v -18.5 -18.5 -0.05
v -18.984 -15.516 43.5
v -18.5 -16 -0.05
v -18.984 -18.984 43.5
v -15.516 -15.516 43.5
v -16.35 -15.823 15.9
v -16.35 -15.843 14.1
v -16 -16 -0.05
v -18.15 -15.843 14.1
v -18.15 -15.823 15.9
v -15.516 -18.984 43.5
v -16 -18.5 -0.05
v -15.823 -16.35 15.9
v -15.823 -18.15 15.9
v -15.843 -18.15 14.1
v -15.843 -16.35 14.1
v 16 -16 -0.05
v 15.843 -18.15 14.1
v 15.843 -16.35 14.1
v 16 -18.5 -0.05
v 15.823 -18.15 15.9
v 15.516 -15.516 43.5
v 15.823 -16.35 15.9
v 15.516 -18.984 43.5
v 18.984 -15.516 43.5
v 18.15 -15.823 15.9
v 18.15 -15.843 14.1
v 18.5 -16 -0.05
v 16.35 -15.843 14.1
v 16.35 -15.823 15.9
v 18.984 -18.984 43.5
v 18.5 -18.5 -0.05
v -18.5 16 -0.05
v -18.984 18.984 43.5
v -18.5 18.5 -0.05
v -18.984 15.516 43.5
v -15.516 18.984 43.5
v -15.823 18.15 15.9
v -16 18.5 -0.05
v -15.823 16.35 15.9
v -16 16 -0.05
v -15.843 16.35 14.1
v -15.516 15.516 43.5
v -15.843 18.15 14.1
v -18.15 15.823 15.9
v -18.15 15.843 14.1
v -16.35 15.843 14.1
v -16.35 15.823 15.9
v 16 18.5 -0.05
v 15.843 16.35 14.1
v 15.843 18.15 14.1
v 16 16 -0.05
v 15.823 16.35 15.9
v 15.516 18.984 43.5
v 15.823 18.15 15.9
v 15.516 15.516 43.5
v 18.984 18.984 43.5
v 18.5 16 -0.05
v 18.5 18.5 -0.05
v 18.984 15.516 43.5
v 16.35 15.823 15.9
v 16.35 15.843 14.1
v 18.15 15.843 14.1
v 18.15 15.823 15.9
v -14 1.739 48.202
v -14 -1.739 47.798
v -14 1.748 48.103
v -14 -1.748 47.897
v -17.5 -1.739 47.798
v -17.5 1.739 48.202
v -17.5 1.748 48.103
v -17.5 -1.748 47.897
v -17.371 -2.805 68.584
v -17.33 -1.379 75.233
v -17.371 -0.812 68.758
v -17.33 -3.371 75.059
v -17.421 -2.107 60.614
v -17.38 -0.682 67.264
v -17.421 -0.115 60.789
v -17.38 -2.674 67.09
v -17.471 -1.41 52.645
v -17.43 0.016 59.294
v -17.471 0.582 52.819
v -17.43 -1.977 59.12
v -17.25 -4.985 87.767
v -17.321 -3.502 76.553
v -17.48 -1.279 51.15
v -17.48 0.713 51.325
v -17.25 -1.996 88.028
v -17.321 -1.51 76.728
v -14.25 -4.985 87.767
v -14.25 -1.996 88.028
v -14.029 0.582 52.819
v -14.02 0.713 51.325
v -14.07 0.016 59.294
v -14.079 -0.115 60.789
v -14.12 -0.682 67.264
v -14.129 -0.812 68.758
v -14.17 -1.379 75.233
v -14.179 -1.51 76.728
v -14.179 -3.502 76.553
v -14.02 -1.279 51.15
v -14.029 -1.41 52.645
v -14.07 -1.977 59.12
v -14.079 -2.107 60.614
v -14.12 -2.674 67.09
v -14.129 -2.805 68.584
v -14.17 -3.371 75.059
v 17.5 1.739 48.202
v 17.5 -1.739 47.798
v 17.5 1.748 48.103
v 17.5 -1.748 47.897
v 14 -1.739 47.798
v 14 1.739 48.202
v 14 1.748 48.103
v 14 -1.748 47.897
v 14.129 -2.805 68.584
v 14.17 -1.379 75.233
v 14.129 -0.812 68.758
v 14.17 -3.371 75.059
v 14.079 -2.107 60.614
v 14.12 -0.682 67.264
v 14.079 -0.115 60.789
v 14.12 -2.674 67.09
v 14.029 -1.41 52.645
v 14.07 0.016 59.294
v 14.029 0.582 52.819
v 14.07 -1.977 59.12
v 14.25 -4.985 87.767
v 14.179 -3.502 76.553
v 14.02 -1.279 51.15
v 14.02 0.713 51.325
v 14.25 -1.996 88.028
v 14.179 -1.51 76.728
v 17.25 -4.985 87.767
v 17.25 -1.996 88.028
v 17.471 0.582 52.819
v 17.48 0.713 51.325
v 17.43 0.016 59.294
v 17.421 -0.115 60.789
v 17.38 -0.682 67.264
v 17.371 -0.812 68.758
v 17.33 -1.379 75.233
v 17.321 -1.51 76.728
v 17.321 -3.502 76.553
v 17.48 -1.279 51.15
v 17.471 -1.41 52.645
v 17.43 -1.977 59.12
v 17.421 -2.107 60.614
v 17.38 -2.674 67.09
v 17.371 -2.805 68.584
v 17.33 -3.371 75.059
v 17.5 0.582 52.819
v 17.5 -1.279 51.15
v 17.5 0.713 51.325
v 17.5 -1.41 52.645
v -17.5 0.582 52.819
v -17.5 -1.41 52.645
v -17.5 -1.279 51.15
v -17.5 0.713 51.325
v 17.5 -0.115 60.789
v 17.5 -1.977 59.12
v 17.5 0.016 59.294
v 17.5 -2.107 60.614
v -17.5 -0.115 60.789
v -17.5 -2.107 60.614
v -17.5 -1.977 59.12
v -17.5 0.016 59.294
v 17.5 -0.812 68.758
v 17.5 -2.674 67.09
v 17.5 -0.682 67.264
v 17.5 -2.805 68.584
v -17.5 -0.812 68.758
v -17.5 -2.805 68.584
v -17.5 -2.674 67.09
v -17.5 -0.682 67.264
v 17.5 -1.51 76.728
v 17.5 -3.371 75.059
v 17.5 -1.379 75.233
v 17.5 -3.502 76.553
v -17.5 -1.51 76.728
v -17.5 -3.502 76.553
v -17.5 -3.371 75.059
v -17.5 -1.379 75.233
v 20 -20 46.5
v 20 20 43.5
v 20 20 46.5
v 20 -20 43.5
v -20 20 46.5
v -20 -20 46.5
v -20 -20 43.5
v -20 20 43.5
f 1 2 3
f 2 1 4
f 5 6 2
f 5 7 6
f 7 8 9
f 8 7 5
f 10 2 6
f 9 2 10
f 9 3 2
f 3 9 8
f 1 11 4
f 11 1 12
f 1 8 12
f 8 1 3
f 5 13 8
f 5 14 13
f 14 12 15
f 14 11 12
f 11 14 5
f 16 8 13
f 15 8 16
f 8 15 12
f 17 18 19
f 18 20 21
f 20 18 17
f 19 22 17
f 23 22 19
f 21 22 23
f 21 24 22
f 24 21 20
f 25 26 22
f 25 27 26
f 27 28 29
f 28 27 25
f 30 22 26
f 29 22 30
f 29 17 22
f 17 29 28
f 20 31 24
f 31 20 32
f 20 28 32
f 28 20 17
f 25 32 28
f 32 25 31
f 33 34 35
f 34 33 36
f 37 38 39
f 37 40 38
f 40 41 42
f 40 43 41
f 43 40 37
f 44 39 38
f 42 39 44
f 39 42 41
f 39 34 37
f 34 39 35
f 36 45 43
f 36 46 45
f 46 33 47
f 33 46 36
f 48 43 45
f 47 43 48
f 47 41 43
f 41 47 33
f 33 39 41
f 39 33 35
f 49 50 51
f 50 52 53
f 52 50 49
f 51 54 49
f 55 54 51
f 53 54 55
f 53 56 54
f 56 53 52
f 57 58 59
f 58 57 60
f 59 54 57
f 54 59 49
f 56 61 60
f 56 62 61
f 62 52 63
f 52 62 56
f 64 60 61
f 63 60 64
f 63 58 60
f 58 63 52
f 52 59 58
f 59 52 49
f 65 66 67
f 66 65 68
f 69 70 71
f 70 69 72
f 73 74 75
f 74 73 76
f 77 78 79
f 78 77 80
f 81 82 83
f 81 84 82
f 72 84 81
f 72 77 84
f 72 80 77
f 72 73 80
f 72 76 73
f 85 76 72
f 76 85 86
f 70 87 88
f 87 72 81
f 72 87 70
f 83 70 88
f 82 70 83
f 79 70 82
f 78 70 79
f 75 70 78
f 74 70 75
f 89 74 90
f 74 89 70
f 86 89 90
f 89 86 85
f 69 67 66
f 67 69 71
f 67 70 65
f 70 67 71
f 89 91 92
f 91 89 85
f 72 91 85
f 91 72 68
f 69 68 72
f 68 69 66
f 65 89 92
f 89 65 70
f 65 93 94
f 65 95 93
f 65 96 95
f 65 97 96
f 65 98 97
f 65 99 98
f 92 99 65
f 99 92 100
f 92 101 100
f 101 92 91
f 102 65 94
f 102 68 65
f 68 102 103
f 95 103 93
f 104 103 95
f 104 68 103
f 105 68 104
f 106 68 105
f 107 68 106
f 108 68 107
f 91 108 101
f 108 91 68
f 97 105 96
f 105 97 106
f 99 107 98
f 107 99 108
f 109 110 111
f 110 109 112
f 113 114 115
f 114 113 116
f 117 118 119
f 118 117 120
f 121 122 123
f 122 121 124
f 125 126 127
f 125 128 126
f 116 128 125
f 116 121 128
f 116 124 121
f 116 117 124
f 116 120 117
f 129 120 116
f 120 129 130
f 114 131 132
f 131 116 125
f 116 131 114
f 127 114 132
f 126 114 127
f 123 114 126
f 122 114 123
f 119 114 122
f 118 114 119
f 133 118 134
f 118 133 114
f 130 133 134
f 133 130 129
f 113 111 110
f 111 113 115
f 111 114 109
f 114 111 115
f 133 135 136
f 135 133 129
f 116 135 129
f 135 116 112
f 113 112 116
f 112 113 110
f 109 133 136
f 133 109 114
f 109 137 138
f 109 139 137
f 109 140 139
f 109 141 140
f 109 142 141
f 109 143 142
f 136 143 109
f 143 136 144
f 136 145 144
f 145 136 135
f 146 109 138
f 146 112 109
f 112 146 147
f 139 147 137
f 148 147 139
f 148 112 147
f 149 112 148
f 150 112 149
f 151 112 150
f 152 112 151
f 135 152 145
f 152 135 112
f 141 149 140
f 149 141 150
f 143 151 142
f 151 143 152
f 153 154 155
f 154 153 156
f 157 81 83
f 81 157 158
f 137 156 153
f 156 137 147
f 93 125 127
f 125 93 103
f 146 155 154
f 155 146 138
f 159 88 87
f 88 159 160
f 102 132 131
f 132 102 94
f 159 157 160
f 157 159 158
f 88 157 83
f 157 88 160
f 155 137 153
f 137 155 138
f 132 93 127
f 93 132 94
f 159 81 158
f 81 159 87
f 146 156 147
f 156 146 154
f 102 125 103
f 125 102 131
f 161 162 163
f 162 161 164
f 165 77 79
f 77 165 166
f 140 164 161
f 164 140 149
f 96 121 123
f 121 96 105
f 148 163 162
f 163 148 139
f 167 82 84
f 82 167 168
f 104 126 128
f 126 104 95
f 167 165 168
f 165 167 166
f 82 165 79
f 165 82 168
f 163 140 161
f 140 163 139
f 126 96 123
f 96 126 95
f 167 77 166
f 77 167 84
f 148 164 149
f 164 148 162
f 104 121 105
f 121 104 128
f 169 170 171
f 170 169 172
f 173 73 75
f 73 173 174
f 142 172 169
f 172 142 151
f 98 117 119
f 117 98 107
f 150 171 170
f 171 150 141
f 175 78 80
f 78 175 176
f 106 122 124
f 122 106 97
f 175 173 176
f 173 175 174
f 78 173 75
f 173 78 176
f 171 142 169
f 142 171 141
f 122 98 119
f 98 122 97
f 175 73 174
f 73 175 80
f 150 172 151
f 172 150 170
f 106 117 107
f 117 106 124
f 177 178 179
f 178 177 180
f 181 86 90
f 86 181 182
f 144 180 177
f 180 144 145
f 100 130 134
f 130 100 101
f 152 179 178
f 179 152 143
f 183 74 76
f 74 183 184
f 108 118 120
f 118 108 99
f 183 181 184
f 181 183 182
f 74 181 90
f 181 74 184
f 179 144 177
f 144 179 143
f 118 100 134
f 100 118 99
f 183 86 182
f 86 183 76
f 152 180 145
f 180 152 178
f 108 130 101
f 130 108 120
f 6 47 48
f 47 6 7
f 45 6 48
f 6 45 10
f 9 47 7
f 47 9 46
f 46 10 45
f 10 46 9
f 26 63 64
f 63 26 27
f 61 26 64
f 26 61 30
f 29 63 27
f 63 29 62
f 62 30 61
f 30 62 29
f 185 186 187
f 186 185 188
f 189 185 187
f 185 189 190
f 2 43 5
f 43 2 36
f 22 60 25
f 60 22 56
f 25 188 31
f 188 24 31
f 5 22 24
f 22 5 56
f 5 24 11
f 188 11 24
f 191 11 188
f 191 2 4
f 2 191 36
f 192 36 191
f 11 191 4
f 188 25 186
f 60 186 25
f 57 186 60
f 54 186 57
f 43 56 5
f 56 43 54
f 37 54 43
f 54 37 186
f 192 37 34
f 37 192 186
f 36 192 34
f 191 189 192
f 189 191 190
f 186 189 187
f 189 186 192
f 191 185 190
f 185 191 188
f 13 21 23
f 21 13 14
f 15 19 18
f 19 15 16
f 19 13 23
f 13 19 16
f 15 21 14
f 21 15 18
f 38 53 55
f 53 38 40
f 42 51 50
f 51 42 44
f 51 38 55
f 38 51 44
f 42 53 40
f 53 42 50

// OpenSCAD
// Parameters
seat_width = 40.0;
seat_depth = 40.0;
seat_thickness = 3.0;
seat_height = 45.0;
leg_top_size = 3.5;
leg_bottom_size = 2.5;
leg_height = 45.0;
back_post_top_size = 3.0;
back_post_bottom_size = 3.5;
back_post_height = 40.0;
back_angle = 5.0;
slat_width = 35.0;
slat_thickness = 1.5;
slat_depth = 2.0;
num_slats = 4.0;
slat_spacing = 8.0;
stretcher_size = 1.8;
stretcher_inset = 4.0;
stretcher_height_front = 15.0;
stretcher_height_side = 15.0;
$fn = 30;

// Model
module tapered_leg() {
    hull() {
        translate([0, 0, 0])
            cube([leg_bottom_size, leg_bottom_size, 0.1], center=true);
        translate([0, 0, leg_height])
            cube([leg_top_size, leg_top_size, 0.1], center=true);
    }
}

module back_post() {
    hull() {
        translate([0, 0, 0])
            cube([back_post_bottom_size, back_post_bottom_size, 0.1], center=true);
        translate([0, 0, back_post_height])
            cube([back_post_top_size, back_post_top_size, 0.1], center=true);
    }
}

union() {
    // Seat
    translate([0, 0, seat_height])
        cube([seat_width, seat_depth, seat_thickness], center=true);

    // Four legs
    leg_offset_x = seat_width/2 - leg_top_size/2 - 1;
    leg_offset_y = seat_depth/2 - leg_top_size/2 - 1;

    for (i = [0:3]) {
        x = (i % 2 == 0) ? -leg_offset_x : leg_offset_x;
        y = (i < 2) ? -leg_offset_y : leg_offset_y;
        translate([x, y, 0])
            tapered_leg();
    }

    // Back posts
    translate([0, 0, seat_height + seat_thickness])
        rotate([back_angle, 0, 0]) {
            for (x = [-1, 1]) {
                translate([x * (slat_width/2 - back_post_bottom_size/2), 0, 0])
                    back_post();
            }

            // Back slats
            for (i = [0:num_slats-1]) {
                slat_z = i * slat_spacing + 4;
                translate([0, 0, slat_z])
                    cube([slat_width, slat_depth, slat_thickness], center=true);
            }
        }

    // Front stretcher
    translate([0, -leg_offset_y, stretcher_height_front])
        cube([seat_width - 2*stretcher_inset, stretcher_size, stretcher_size], center=true);

    // Back stretcher
    translate([0, leg_offset_y, stretcher_height_front])
        cube([seat_width - 2*stretcher_inset, stretcher_size, stretcher_size], center=true);

    // Side stretchers
    for (x = [-1, 1]) {
        translate([x * leg_offset_x, 0, stretcher_height_side])
            cube([stretcher_size, seat_depth - 2*stretcher_inset, stretcher_size], center=true);
    }
}
